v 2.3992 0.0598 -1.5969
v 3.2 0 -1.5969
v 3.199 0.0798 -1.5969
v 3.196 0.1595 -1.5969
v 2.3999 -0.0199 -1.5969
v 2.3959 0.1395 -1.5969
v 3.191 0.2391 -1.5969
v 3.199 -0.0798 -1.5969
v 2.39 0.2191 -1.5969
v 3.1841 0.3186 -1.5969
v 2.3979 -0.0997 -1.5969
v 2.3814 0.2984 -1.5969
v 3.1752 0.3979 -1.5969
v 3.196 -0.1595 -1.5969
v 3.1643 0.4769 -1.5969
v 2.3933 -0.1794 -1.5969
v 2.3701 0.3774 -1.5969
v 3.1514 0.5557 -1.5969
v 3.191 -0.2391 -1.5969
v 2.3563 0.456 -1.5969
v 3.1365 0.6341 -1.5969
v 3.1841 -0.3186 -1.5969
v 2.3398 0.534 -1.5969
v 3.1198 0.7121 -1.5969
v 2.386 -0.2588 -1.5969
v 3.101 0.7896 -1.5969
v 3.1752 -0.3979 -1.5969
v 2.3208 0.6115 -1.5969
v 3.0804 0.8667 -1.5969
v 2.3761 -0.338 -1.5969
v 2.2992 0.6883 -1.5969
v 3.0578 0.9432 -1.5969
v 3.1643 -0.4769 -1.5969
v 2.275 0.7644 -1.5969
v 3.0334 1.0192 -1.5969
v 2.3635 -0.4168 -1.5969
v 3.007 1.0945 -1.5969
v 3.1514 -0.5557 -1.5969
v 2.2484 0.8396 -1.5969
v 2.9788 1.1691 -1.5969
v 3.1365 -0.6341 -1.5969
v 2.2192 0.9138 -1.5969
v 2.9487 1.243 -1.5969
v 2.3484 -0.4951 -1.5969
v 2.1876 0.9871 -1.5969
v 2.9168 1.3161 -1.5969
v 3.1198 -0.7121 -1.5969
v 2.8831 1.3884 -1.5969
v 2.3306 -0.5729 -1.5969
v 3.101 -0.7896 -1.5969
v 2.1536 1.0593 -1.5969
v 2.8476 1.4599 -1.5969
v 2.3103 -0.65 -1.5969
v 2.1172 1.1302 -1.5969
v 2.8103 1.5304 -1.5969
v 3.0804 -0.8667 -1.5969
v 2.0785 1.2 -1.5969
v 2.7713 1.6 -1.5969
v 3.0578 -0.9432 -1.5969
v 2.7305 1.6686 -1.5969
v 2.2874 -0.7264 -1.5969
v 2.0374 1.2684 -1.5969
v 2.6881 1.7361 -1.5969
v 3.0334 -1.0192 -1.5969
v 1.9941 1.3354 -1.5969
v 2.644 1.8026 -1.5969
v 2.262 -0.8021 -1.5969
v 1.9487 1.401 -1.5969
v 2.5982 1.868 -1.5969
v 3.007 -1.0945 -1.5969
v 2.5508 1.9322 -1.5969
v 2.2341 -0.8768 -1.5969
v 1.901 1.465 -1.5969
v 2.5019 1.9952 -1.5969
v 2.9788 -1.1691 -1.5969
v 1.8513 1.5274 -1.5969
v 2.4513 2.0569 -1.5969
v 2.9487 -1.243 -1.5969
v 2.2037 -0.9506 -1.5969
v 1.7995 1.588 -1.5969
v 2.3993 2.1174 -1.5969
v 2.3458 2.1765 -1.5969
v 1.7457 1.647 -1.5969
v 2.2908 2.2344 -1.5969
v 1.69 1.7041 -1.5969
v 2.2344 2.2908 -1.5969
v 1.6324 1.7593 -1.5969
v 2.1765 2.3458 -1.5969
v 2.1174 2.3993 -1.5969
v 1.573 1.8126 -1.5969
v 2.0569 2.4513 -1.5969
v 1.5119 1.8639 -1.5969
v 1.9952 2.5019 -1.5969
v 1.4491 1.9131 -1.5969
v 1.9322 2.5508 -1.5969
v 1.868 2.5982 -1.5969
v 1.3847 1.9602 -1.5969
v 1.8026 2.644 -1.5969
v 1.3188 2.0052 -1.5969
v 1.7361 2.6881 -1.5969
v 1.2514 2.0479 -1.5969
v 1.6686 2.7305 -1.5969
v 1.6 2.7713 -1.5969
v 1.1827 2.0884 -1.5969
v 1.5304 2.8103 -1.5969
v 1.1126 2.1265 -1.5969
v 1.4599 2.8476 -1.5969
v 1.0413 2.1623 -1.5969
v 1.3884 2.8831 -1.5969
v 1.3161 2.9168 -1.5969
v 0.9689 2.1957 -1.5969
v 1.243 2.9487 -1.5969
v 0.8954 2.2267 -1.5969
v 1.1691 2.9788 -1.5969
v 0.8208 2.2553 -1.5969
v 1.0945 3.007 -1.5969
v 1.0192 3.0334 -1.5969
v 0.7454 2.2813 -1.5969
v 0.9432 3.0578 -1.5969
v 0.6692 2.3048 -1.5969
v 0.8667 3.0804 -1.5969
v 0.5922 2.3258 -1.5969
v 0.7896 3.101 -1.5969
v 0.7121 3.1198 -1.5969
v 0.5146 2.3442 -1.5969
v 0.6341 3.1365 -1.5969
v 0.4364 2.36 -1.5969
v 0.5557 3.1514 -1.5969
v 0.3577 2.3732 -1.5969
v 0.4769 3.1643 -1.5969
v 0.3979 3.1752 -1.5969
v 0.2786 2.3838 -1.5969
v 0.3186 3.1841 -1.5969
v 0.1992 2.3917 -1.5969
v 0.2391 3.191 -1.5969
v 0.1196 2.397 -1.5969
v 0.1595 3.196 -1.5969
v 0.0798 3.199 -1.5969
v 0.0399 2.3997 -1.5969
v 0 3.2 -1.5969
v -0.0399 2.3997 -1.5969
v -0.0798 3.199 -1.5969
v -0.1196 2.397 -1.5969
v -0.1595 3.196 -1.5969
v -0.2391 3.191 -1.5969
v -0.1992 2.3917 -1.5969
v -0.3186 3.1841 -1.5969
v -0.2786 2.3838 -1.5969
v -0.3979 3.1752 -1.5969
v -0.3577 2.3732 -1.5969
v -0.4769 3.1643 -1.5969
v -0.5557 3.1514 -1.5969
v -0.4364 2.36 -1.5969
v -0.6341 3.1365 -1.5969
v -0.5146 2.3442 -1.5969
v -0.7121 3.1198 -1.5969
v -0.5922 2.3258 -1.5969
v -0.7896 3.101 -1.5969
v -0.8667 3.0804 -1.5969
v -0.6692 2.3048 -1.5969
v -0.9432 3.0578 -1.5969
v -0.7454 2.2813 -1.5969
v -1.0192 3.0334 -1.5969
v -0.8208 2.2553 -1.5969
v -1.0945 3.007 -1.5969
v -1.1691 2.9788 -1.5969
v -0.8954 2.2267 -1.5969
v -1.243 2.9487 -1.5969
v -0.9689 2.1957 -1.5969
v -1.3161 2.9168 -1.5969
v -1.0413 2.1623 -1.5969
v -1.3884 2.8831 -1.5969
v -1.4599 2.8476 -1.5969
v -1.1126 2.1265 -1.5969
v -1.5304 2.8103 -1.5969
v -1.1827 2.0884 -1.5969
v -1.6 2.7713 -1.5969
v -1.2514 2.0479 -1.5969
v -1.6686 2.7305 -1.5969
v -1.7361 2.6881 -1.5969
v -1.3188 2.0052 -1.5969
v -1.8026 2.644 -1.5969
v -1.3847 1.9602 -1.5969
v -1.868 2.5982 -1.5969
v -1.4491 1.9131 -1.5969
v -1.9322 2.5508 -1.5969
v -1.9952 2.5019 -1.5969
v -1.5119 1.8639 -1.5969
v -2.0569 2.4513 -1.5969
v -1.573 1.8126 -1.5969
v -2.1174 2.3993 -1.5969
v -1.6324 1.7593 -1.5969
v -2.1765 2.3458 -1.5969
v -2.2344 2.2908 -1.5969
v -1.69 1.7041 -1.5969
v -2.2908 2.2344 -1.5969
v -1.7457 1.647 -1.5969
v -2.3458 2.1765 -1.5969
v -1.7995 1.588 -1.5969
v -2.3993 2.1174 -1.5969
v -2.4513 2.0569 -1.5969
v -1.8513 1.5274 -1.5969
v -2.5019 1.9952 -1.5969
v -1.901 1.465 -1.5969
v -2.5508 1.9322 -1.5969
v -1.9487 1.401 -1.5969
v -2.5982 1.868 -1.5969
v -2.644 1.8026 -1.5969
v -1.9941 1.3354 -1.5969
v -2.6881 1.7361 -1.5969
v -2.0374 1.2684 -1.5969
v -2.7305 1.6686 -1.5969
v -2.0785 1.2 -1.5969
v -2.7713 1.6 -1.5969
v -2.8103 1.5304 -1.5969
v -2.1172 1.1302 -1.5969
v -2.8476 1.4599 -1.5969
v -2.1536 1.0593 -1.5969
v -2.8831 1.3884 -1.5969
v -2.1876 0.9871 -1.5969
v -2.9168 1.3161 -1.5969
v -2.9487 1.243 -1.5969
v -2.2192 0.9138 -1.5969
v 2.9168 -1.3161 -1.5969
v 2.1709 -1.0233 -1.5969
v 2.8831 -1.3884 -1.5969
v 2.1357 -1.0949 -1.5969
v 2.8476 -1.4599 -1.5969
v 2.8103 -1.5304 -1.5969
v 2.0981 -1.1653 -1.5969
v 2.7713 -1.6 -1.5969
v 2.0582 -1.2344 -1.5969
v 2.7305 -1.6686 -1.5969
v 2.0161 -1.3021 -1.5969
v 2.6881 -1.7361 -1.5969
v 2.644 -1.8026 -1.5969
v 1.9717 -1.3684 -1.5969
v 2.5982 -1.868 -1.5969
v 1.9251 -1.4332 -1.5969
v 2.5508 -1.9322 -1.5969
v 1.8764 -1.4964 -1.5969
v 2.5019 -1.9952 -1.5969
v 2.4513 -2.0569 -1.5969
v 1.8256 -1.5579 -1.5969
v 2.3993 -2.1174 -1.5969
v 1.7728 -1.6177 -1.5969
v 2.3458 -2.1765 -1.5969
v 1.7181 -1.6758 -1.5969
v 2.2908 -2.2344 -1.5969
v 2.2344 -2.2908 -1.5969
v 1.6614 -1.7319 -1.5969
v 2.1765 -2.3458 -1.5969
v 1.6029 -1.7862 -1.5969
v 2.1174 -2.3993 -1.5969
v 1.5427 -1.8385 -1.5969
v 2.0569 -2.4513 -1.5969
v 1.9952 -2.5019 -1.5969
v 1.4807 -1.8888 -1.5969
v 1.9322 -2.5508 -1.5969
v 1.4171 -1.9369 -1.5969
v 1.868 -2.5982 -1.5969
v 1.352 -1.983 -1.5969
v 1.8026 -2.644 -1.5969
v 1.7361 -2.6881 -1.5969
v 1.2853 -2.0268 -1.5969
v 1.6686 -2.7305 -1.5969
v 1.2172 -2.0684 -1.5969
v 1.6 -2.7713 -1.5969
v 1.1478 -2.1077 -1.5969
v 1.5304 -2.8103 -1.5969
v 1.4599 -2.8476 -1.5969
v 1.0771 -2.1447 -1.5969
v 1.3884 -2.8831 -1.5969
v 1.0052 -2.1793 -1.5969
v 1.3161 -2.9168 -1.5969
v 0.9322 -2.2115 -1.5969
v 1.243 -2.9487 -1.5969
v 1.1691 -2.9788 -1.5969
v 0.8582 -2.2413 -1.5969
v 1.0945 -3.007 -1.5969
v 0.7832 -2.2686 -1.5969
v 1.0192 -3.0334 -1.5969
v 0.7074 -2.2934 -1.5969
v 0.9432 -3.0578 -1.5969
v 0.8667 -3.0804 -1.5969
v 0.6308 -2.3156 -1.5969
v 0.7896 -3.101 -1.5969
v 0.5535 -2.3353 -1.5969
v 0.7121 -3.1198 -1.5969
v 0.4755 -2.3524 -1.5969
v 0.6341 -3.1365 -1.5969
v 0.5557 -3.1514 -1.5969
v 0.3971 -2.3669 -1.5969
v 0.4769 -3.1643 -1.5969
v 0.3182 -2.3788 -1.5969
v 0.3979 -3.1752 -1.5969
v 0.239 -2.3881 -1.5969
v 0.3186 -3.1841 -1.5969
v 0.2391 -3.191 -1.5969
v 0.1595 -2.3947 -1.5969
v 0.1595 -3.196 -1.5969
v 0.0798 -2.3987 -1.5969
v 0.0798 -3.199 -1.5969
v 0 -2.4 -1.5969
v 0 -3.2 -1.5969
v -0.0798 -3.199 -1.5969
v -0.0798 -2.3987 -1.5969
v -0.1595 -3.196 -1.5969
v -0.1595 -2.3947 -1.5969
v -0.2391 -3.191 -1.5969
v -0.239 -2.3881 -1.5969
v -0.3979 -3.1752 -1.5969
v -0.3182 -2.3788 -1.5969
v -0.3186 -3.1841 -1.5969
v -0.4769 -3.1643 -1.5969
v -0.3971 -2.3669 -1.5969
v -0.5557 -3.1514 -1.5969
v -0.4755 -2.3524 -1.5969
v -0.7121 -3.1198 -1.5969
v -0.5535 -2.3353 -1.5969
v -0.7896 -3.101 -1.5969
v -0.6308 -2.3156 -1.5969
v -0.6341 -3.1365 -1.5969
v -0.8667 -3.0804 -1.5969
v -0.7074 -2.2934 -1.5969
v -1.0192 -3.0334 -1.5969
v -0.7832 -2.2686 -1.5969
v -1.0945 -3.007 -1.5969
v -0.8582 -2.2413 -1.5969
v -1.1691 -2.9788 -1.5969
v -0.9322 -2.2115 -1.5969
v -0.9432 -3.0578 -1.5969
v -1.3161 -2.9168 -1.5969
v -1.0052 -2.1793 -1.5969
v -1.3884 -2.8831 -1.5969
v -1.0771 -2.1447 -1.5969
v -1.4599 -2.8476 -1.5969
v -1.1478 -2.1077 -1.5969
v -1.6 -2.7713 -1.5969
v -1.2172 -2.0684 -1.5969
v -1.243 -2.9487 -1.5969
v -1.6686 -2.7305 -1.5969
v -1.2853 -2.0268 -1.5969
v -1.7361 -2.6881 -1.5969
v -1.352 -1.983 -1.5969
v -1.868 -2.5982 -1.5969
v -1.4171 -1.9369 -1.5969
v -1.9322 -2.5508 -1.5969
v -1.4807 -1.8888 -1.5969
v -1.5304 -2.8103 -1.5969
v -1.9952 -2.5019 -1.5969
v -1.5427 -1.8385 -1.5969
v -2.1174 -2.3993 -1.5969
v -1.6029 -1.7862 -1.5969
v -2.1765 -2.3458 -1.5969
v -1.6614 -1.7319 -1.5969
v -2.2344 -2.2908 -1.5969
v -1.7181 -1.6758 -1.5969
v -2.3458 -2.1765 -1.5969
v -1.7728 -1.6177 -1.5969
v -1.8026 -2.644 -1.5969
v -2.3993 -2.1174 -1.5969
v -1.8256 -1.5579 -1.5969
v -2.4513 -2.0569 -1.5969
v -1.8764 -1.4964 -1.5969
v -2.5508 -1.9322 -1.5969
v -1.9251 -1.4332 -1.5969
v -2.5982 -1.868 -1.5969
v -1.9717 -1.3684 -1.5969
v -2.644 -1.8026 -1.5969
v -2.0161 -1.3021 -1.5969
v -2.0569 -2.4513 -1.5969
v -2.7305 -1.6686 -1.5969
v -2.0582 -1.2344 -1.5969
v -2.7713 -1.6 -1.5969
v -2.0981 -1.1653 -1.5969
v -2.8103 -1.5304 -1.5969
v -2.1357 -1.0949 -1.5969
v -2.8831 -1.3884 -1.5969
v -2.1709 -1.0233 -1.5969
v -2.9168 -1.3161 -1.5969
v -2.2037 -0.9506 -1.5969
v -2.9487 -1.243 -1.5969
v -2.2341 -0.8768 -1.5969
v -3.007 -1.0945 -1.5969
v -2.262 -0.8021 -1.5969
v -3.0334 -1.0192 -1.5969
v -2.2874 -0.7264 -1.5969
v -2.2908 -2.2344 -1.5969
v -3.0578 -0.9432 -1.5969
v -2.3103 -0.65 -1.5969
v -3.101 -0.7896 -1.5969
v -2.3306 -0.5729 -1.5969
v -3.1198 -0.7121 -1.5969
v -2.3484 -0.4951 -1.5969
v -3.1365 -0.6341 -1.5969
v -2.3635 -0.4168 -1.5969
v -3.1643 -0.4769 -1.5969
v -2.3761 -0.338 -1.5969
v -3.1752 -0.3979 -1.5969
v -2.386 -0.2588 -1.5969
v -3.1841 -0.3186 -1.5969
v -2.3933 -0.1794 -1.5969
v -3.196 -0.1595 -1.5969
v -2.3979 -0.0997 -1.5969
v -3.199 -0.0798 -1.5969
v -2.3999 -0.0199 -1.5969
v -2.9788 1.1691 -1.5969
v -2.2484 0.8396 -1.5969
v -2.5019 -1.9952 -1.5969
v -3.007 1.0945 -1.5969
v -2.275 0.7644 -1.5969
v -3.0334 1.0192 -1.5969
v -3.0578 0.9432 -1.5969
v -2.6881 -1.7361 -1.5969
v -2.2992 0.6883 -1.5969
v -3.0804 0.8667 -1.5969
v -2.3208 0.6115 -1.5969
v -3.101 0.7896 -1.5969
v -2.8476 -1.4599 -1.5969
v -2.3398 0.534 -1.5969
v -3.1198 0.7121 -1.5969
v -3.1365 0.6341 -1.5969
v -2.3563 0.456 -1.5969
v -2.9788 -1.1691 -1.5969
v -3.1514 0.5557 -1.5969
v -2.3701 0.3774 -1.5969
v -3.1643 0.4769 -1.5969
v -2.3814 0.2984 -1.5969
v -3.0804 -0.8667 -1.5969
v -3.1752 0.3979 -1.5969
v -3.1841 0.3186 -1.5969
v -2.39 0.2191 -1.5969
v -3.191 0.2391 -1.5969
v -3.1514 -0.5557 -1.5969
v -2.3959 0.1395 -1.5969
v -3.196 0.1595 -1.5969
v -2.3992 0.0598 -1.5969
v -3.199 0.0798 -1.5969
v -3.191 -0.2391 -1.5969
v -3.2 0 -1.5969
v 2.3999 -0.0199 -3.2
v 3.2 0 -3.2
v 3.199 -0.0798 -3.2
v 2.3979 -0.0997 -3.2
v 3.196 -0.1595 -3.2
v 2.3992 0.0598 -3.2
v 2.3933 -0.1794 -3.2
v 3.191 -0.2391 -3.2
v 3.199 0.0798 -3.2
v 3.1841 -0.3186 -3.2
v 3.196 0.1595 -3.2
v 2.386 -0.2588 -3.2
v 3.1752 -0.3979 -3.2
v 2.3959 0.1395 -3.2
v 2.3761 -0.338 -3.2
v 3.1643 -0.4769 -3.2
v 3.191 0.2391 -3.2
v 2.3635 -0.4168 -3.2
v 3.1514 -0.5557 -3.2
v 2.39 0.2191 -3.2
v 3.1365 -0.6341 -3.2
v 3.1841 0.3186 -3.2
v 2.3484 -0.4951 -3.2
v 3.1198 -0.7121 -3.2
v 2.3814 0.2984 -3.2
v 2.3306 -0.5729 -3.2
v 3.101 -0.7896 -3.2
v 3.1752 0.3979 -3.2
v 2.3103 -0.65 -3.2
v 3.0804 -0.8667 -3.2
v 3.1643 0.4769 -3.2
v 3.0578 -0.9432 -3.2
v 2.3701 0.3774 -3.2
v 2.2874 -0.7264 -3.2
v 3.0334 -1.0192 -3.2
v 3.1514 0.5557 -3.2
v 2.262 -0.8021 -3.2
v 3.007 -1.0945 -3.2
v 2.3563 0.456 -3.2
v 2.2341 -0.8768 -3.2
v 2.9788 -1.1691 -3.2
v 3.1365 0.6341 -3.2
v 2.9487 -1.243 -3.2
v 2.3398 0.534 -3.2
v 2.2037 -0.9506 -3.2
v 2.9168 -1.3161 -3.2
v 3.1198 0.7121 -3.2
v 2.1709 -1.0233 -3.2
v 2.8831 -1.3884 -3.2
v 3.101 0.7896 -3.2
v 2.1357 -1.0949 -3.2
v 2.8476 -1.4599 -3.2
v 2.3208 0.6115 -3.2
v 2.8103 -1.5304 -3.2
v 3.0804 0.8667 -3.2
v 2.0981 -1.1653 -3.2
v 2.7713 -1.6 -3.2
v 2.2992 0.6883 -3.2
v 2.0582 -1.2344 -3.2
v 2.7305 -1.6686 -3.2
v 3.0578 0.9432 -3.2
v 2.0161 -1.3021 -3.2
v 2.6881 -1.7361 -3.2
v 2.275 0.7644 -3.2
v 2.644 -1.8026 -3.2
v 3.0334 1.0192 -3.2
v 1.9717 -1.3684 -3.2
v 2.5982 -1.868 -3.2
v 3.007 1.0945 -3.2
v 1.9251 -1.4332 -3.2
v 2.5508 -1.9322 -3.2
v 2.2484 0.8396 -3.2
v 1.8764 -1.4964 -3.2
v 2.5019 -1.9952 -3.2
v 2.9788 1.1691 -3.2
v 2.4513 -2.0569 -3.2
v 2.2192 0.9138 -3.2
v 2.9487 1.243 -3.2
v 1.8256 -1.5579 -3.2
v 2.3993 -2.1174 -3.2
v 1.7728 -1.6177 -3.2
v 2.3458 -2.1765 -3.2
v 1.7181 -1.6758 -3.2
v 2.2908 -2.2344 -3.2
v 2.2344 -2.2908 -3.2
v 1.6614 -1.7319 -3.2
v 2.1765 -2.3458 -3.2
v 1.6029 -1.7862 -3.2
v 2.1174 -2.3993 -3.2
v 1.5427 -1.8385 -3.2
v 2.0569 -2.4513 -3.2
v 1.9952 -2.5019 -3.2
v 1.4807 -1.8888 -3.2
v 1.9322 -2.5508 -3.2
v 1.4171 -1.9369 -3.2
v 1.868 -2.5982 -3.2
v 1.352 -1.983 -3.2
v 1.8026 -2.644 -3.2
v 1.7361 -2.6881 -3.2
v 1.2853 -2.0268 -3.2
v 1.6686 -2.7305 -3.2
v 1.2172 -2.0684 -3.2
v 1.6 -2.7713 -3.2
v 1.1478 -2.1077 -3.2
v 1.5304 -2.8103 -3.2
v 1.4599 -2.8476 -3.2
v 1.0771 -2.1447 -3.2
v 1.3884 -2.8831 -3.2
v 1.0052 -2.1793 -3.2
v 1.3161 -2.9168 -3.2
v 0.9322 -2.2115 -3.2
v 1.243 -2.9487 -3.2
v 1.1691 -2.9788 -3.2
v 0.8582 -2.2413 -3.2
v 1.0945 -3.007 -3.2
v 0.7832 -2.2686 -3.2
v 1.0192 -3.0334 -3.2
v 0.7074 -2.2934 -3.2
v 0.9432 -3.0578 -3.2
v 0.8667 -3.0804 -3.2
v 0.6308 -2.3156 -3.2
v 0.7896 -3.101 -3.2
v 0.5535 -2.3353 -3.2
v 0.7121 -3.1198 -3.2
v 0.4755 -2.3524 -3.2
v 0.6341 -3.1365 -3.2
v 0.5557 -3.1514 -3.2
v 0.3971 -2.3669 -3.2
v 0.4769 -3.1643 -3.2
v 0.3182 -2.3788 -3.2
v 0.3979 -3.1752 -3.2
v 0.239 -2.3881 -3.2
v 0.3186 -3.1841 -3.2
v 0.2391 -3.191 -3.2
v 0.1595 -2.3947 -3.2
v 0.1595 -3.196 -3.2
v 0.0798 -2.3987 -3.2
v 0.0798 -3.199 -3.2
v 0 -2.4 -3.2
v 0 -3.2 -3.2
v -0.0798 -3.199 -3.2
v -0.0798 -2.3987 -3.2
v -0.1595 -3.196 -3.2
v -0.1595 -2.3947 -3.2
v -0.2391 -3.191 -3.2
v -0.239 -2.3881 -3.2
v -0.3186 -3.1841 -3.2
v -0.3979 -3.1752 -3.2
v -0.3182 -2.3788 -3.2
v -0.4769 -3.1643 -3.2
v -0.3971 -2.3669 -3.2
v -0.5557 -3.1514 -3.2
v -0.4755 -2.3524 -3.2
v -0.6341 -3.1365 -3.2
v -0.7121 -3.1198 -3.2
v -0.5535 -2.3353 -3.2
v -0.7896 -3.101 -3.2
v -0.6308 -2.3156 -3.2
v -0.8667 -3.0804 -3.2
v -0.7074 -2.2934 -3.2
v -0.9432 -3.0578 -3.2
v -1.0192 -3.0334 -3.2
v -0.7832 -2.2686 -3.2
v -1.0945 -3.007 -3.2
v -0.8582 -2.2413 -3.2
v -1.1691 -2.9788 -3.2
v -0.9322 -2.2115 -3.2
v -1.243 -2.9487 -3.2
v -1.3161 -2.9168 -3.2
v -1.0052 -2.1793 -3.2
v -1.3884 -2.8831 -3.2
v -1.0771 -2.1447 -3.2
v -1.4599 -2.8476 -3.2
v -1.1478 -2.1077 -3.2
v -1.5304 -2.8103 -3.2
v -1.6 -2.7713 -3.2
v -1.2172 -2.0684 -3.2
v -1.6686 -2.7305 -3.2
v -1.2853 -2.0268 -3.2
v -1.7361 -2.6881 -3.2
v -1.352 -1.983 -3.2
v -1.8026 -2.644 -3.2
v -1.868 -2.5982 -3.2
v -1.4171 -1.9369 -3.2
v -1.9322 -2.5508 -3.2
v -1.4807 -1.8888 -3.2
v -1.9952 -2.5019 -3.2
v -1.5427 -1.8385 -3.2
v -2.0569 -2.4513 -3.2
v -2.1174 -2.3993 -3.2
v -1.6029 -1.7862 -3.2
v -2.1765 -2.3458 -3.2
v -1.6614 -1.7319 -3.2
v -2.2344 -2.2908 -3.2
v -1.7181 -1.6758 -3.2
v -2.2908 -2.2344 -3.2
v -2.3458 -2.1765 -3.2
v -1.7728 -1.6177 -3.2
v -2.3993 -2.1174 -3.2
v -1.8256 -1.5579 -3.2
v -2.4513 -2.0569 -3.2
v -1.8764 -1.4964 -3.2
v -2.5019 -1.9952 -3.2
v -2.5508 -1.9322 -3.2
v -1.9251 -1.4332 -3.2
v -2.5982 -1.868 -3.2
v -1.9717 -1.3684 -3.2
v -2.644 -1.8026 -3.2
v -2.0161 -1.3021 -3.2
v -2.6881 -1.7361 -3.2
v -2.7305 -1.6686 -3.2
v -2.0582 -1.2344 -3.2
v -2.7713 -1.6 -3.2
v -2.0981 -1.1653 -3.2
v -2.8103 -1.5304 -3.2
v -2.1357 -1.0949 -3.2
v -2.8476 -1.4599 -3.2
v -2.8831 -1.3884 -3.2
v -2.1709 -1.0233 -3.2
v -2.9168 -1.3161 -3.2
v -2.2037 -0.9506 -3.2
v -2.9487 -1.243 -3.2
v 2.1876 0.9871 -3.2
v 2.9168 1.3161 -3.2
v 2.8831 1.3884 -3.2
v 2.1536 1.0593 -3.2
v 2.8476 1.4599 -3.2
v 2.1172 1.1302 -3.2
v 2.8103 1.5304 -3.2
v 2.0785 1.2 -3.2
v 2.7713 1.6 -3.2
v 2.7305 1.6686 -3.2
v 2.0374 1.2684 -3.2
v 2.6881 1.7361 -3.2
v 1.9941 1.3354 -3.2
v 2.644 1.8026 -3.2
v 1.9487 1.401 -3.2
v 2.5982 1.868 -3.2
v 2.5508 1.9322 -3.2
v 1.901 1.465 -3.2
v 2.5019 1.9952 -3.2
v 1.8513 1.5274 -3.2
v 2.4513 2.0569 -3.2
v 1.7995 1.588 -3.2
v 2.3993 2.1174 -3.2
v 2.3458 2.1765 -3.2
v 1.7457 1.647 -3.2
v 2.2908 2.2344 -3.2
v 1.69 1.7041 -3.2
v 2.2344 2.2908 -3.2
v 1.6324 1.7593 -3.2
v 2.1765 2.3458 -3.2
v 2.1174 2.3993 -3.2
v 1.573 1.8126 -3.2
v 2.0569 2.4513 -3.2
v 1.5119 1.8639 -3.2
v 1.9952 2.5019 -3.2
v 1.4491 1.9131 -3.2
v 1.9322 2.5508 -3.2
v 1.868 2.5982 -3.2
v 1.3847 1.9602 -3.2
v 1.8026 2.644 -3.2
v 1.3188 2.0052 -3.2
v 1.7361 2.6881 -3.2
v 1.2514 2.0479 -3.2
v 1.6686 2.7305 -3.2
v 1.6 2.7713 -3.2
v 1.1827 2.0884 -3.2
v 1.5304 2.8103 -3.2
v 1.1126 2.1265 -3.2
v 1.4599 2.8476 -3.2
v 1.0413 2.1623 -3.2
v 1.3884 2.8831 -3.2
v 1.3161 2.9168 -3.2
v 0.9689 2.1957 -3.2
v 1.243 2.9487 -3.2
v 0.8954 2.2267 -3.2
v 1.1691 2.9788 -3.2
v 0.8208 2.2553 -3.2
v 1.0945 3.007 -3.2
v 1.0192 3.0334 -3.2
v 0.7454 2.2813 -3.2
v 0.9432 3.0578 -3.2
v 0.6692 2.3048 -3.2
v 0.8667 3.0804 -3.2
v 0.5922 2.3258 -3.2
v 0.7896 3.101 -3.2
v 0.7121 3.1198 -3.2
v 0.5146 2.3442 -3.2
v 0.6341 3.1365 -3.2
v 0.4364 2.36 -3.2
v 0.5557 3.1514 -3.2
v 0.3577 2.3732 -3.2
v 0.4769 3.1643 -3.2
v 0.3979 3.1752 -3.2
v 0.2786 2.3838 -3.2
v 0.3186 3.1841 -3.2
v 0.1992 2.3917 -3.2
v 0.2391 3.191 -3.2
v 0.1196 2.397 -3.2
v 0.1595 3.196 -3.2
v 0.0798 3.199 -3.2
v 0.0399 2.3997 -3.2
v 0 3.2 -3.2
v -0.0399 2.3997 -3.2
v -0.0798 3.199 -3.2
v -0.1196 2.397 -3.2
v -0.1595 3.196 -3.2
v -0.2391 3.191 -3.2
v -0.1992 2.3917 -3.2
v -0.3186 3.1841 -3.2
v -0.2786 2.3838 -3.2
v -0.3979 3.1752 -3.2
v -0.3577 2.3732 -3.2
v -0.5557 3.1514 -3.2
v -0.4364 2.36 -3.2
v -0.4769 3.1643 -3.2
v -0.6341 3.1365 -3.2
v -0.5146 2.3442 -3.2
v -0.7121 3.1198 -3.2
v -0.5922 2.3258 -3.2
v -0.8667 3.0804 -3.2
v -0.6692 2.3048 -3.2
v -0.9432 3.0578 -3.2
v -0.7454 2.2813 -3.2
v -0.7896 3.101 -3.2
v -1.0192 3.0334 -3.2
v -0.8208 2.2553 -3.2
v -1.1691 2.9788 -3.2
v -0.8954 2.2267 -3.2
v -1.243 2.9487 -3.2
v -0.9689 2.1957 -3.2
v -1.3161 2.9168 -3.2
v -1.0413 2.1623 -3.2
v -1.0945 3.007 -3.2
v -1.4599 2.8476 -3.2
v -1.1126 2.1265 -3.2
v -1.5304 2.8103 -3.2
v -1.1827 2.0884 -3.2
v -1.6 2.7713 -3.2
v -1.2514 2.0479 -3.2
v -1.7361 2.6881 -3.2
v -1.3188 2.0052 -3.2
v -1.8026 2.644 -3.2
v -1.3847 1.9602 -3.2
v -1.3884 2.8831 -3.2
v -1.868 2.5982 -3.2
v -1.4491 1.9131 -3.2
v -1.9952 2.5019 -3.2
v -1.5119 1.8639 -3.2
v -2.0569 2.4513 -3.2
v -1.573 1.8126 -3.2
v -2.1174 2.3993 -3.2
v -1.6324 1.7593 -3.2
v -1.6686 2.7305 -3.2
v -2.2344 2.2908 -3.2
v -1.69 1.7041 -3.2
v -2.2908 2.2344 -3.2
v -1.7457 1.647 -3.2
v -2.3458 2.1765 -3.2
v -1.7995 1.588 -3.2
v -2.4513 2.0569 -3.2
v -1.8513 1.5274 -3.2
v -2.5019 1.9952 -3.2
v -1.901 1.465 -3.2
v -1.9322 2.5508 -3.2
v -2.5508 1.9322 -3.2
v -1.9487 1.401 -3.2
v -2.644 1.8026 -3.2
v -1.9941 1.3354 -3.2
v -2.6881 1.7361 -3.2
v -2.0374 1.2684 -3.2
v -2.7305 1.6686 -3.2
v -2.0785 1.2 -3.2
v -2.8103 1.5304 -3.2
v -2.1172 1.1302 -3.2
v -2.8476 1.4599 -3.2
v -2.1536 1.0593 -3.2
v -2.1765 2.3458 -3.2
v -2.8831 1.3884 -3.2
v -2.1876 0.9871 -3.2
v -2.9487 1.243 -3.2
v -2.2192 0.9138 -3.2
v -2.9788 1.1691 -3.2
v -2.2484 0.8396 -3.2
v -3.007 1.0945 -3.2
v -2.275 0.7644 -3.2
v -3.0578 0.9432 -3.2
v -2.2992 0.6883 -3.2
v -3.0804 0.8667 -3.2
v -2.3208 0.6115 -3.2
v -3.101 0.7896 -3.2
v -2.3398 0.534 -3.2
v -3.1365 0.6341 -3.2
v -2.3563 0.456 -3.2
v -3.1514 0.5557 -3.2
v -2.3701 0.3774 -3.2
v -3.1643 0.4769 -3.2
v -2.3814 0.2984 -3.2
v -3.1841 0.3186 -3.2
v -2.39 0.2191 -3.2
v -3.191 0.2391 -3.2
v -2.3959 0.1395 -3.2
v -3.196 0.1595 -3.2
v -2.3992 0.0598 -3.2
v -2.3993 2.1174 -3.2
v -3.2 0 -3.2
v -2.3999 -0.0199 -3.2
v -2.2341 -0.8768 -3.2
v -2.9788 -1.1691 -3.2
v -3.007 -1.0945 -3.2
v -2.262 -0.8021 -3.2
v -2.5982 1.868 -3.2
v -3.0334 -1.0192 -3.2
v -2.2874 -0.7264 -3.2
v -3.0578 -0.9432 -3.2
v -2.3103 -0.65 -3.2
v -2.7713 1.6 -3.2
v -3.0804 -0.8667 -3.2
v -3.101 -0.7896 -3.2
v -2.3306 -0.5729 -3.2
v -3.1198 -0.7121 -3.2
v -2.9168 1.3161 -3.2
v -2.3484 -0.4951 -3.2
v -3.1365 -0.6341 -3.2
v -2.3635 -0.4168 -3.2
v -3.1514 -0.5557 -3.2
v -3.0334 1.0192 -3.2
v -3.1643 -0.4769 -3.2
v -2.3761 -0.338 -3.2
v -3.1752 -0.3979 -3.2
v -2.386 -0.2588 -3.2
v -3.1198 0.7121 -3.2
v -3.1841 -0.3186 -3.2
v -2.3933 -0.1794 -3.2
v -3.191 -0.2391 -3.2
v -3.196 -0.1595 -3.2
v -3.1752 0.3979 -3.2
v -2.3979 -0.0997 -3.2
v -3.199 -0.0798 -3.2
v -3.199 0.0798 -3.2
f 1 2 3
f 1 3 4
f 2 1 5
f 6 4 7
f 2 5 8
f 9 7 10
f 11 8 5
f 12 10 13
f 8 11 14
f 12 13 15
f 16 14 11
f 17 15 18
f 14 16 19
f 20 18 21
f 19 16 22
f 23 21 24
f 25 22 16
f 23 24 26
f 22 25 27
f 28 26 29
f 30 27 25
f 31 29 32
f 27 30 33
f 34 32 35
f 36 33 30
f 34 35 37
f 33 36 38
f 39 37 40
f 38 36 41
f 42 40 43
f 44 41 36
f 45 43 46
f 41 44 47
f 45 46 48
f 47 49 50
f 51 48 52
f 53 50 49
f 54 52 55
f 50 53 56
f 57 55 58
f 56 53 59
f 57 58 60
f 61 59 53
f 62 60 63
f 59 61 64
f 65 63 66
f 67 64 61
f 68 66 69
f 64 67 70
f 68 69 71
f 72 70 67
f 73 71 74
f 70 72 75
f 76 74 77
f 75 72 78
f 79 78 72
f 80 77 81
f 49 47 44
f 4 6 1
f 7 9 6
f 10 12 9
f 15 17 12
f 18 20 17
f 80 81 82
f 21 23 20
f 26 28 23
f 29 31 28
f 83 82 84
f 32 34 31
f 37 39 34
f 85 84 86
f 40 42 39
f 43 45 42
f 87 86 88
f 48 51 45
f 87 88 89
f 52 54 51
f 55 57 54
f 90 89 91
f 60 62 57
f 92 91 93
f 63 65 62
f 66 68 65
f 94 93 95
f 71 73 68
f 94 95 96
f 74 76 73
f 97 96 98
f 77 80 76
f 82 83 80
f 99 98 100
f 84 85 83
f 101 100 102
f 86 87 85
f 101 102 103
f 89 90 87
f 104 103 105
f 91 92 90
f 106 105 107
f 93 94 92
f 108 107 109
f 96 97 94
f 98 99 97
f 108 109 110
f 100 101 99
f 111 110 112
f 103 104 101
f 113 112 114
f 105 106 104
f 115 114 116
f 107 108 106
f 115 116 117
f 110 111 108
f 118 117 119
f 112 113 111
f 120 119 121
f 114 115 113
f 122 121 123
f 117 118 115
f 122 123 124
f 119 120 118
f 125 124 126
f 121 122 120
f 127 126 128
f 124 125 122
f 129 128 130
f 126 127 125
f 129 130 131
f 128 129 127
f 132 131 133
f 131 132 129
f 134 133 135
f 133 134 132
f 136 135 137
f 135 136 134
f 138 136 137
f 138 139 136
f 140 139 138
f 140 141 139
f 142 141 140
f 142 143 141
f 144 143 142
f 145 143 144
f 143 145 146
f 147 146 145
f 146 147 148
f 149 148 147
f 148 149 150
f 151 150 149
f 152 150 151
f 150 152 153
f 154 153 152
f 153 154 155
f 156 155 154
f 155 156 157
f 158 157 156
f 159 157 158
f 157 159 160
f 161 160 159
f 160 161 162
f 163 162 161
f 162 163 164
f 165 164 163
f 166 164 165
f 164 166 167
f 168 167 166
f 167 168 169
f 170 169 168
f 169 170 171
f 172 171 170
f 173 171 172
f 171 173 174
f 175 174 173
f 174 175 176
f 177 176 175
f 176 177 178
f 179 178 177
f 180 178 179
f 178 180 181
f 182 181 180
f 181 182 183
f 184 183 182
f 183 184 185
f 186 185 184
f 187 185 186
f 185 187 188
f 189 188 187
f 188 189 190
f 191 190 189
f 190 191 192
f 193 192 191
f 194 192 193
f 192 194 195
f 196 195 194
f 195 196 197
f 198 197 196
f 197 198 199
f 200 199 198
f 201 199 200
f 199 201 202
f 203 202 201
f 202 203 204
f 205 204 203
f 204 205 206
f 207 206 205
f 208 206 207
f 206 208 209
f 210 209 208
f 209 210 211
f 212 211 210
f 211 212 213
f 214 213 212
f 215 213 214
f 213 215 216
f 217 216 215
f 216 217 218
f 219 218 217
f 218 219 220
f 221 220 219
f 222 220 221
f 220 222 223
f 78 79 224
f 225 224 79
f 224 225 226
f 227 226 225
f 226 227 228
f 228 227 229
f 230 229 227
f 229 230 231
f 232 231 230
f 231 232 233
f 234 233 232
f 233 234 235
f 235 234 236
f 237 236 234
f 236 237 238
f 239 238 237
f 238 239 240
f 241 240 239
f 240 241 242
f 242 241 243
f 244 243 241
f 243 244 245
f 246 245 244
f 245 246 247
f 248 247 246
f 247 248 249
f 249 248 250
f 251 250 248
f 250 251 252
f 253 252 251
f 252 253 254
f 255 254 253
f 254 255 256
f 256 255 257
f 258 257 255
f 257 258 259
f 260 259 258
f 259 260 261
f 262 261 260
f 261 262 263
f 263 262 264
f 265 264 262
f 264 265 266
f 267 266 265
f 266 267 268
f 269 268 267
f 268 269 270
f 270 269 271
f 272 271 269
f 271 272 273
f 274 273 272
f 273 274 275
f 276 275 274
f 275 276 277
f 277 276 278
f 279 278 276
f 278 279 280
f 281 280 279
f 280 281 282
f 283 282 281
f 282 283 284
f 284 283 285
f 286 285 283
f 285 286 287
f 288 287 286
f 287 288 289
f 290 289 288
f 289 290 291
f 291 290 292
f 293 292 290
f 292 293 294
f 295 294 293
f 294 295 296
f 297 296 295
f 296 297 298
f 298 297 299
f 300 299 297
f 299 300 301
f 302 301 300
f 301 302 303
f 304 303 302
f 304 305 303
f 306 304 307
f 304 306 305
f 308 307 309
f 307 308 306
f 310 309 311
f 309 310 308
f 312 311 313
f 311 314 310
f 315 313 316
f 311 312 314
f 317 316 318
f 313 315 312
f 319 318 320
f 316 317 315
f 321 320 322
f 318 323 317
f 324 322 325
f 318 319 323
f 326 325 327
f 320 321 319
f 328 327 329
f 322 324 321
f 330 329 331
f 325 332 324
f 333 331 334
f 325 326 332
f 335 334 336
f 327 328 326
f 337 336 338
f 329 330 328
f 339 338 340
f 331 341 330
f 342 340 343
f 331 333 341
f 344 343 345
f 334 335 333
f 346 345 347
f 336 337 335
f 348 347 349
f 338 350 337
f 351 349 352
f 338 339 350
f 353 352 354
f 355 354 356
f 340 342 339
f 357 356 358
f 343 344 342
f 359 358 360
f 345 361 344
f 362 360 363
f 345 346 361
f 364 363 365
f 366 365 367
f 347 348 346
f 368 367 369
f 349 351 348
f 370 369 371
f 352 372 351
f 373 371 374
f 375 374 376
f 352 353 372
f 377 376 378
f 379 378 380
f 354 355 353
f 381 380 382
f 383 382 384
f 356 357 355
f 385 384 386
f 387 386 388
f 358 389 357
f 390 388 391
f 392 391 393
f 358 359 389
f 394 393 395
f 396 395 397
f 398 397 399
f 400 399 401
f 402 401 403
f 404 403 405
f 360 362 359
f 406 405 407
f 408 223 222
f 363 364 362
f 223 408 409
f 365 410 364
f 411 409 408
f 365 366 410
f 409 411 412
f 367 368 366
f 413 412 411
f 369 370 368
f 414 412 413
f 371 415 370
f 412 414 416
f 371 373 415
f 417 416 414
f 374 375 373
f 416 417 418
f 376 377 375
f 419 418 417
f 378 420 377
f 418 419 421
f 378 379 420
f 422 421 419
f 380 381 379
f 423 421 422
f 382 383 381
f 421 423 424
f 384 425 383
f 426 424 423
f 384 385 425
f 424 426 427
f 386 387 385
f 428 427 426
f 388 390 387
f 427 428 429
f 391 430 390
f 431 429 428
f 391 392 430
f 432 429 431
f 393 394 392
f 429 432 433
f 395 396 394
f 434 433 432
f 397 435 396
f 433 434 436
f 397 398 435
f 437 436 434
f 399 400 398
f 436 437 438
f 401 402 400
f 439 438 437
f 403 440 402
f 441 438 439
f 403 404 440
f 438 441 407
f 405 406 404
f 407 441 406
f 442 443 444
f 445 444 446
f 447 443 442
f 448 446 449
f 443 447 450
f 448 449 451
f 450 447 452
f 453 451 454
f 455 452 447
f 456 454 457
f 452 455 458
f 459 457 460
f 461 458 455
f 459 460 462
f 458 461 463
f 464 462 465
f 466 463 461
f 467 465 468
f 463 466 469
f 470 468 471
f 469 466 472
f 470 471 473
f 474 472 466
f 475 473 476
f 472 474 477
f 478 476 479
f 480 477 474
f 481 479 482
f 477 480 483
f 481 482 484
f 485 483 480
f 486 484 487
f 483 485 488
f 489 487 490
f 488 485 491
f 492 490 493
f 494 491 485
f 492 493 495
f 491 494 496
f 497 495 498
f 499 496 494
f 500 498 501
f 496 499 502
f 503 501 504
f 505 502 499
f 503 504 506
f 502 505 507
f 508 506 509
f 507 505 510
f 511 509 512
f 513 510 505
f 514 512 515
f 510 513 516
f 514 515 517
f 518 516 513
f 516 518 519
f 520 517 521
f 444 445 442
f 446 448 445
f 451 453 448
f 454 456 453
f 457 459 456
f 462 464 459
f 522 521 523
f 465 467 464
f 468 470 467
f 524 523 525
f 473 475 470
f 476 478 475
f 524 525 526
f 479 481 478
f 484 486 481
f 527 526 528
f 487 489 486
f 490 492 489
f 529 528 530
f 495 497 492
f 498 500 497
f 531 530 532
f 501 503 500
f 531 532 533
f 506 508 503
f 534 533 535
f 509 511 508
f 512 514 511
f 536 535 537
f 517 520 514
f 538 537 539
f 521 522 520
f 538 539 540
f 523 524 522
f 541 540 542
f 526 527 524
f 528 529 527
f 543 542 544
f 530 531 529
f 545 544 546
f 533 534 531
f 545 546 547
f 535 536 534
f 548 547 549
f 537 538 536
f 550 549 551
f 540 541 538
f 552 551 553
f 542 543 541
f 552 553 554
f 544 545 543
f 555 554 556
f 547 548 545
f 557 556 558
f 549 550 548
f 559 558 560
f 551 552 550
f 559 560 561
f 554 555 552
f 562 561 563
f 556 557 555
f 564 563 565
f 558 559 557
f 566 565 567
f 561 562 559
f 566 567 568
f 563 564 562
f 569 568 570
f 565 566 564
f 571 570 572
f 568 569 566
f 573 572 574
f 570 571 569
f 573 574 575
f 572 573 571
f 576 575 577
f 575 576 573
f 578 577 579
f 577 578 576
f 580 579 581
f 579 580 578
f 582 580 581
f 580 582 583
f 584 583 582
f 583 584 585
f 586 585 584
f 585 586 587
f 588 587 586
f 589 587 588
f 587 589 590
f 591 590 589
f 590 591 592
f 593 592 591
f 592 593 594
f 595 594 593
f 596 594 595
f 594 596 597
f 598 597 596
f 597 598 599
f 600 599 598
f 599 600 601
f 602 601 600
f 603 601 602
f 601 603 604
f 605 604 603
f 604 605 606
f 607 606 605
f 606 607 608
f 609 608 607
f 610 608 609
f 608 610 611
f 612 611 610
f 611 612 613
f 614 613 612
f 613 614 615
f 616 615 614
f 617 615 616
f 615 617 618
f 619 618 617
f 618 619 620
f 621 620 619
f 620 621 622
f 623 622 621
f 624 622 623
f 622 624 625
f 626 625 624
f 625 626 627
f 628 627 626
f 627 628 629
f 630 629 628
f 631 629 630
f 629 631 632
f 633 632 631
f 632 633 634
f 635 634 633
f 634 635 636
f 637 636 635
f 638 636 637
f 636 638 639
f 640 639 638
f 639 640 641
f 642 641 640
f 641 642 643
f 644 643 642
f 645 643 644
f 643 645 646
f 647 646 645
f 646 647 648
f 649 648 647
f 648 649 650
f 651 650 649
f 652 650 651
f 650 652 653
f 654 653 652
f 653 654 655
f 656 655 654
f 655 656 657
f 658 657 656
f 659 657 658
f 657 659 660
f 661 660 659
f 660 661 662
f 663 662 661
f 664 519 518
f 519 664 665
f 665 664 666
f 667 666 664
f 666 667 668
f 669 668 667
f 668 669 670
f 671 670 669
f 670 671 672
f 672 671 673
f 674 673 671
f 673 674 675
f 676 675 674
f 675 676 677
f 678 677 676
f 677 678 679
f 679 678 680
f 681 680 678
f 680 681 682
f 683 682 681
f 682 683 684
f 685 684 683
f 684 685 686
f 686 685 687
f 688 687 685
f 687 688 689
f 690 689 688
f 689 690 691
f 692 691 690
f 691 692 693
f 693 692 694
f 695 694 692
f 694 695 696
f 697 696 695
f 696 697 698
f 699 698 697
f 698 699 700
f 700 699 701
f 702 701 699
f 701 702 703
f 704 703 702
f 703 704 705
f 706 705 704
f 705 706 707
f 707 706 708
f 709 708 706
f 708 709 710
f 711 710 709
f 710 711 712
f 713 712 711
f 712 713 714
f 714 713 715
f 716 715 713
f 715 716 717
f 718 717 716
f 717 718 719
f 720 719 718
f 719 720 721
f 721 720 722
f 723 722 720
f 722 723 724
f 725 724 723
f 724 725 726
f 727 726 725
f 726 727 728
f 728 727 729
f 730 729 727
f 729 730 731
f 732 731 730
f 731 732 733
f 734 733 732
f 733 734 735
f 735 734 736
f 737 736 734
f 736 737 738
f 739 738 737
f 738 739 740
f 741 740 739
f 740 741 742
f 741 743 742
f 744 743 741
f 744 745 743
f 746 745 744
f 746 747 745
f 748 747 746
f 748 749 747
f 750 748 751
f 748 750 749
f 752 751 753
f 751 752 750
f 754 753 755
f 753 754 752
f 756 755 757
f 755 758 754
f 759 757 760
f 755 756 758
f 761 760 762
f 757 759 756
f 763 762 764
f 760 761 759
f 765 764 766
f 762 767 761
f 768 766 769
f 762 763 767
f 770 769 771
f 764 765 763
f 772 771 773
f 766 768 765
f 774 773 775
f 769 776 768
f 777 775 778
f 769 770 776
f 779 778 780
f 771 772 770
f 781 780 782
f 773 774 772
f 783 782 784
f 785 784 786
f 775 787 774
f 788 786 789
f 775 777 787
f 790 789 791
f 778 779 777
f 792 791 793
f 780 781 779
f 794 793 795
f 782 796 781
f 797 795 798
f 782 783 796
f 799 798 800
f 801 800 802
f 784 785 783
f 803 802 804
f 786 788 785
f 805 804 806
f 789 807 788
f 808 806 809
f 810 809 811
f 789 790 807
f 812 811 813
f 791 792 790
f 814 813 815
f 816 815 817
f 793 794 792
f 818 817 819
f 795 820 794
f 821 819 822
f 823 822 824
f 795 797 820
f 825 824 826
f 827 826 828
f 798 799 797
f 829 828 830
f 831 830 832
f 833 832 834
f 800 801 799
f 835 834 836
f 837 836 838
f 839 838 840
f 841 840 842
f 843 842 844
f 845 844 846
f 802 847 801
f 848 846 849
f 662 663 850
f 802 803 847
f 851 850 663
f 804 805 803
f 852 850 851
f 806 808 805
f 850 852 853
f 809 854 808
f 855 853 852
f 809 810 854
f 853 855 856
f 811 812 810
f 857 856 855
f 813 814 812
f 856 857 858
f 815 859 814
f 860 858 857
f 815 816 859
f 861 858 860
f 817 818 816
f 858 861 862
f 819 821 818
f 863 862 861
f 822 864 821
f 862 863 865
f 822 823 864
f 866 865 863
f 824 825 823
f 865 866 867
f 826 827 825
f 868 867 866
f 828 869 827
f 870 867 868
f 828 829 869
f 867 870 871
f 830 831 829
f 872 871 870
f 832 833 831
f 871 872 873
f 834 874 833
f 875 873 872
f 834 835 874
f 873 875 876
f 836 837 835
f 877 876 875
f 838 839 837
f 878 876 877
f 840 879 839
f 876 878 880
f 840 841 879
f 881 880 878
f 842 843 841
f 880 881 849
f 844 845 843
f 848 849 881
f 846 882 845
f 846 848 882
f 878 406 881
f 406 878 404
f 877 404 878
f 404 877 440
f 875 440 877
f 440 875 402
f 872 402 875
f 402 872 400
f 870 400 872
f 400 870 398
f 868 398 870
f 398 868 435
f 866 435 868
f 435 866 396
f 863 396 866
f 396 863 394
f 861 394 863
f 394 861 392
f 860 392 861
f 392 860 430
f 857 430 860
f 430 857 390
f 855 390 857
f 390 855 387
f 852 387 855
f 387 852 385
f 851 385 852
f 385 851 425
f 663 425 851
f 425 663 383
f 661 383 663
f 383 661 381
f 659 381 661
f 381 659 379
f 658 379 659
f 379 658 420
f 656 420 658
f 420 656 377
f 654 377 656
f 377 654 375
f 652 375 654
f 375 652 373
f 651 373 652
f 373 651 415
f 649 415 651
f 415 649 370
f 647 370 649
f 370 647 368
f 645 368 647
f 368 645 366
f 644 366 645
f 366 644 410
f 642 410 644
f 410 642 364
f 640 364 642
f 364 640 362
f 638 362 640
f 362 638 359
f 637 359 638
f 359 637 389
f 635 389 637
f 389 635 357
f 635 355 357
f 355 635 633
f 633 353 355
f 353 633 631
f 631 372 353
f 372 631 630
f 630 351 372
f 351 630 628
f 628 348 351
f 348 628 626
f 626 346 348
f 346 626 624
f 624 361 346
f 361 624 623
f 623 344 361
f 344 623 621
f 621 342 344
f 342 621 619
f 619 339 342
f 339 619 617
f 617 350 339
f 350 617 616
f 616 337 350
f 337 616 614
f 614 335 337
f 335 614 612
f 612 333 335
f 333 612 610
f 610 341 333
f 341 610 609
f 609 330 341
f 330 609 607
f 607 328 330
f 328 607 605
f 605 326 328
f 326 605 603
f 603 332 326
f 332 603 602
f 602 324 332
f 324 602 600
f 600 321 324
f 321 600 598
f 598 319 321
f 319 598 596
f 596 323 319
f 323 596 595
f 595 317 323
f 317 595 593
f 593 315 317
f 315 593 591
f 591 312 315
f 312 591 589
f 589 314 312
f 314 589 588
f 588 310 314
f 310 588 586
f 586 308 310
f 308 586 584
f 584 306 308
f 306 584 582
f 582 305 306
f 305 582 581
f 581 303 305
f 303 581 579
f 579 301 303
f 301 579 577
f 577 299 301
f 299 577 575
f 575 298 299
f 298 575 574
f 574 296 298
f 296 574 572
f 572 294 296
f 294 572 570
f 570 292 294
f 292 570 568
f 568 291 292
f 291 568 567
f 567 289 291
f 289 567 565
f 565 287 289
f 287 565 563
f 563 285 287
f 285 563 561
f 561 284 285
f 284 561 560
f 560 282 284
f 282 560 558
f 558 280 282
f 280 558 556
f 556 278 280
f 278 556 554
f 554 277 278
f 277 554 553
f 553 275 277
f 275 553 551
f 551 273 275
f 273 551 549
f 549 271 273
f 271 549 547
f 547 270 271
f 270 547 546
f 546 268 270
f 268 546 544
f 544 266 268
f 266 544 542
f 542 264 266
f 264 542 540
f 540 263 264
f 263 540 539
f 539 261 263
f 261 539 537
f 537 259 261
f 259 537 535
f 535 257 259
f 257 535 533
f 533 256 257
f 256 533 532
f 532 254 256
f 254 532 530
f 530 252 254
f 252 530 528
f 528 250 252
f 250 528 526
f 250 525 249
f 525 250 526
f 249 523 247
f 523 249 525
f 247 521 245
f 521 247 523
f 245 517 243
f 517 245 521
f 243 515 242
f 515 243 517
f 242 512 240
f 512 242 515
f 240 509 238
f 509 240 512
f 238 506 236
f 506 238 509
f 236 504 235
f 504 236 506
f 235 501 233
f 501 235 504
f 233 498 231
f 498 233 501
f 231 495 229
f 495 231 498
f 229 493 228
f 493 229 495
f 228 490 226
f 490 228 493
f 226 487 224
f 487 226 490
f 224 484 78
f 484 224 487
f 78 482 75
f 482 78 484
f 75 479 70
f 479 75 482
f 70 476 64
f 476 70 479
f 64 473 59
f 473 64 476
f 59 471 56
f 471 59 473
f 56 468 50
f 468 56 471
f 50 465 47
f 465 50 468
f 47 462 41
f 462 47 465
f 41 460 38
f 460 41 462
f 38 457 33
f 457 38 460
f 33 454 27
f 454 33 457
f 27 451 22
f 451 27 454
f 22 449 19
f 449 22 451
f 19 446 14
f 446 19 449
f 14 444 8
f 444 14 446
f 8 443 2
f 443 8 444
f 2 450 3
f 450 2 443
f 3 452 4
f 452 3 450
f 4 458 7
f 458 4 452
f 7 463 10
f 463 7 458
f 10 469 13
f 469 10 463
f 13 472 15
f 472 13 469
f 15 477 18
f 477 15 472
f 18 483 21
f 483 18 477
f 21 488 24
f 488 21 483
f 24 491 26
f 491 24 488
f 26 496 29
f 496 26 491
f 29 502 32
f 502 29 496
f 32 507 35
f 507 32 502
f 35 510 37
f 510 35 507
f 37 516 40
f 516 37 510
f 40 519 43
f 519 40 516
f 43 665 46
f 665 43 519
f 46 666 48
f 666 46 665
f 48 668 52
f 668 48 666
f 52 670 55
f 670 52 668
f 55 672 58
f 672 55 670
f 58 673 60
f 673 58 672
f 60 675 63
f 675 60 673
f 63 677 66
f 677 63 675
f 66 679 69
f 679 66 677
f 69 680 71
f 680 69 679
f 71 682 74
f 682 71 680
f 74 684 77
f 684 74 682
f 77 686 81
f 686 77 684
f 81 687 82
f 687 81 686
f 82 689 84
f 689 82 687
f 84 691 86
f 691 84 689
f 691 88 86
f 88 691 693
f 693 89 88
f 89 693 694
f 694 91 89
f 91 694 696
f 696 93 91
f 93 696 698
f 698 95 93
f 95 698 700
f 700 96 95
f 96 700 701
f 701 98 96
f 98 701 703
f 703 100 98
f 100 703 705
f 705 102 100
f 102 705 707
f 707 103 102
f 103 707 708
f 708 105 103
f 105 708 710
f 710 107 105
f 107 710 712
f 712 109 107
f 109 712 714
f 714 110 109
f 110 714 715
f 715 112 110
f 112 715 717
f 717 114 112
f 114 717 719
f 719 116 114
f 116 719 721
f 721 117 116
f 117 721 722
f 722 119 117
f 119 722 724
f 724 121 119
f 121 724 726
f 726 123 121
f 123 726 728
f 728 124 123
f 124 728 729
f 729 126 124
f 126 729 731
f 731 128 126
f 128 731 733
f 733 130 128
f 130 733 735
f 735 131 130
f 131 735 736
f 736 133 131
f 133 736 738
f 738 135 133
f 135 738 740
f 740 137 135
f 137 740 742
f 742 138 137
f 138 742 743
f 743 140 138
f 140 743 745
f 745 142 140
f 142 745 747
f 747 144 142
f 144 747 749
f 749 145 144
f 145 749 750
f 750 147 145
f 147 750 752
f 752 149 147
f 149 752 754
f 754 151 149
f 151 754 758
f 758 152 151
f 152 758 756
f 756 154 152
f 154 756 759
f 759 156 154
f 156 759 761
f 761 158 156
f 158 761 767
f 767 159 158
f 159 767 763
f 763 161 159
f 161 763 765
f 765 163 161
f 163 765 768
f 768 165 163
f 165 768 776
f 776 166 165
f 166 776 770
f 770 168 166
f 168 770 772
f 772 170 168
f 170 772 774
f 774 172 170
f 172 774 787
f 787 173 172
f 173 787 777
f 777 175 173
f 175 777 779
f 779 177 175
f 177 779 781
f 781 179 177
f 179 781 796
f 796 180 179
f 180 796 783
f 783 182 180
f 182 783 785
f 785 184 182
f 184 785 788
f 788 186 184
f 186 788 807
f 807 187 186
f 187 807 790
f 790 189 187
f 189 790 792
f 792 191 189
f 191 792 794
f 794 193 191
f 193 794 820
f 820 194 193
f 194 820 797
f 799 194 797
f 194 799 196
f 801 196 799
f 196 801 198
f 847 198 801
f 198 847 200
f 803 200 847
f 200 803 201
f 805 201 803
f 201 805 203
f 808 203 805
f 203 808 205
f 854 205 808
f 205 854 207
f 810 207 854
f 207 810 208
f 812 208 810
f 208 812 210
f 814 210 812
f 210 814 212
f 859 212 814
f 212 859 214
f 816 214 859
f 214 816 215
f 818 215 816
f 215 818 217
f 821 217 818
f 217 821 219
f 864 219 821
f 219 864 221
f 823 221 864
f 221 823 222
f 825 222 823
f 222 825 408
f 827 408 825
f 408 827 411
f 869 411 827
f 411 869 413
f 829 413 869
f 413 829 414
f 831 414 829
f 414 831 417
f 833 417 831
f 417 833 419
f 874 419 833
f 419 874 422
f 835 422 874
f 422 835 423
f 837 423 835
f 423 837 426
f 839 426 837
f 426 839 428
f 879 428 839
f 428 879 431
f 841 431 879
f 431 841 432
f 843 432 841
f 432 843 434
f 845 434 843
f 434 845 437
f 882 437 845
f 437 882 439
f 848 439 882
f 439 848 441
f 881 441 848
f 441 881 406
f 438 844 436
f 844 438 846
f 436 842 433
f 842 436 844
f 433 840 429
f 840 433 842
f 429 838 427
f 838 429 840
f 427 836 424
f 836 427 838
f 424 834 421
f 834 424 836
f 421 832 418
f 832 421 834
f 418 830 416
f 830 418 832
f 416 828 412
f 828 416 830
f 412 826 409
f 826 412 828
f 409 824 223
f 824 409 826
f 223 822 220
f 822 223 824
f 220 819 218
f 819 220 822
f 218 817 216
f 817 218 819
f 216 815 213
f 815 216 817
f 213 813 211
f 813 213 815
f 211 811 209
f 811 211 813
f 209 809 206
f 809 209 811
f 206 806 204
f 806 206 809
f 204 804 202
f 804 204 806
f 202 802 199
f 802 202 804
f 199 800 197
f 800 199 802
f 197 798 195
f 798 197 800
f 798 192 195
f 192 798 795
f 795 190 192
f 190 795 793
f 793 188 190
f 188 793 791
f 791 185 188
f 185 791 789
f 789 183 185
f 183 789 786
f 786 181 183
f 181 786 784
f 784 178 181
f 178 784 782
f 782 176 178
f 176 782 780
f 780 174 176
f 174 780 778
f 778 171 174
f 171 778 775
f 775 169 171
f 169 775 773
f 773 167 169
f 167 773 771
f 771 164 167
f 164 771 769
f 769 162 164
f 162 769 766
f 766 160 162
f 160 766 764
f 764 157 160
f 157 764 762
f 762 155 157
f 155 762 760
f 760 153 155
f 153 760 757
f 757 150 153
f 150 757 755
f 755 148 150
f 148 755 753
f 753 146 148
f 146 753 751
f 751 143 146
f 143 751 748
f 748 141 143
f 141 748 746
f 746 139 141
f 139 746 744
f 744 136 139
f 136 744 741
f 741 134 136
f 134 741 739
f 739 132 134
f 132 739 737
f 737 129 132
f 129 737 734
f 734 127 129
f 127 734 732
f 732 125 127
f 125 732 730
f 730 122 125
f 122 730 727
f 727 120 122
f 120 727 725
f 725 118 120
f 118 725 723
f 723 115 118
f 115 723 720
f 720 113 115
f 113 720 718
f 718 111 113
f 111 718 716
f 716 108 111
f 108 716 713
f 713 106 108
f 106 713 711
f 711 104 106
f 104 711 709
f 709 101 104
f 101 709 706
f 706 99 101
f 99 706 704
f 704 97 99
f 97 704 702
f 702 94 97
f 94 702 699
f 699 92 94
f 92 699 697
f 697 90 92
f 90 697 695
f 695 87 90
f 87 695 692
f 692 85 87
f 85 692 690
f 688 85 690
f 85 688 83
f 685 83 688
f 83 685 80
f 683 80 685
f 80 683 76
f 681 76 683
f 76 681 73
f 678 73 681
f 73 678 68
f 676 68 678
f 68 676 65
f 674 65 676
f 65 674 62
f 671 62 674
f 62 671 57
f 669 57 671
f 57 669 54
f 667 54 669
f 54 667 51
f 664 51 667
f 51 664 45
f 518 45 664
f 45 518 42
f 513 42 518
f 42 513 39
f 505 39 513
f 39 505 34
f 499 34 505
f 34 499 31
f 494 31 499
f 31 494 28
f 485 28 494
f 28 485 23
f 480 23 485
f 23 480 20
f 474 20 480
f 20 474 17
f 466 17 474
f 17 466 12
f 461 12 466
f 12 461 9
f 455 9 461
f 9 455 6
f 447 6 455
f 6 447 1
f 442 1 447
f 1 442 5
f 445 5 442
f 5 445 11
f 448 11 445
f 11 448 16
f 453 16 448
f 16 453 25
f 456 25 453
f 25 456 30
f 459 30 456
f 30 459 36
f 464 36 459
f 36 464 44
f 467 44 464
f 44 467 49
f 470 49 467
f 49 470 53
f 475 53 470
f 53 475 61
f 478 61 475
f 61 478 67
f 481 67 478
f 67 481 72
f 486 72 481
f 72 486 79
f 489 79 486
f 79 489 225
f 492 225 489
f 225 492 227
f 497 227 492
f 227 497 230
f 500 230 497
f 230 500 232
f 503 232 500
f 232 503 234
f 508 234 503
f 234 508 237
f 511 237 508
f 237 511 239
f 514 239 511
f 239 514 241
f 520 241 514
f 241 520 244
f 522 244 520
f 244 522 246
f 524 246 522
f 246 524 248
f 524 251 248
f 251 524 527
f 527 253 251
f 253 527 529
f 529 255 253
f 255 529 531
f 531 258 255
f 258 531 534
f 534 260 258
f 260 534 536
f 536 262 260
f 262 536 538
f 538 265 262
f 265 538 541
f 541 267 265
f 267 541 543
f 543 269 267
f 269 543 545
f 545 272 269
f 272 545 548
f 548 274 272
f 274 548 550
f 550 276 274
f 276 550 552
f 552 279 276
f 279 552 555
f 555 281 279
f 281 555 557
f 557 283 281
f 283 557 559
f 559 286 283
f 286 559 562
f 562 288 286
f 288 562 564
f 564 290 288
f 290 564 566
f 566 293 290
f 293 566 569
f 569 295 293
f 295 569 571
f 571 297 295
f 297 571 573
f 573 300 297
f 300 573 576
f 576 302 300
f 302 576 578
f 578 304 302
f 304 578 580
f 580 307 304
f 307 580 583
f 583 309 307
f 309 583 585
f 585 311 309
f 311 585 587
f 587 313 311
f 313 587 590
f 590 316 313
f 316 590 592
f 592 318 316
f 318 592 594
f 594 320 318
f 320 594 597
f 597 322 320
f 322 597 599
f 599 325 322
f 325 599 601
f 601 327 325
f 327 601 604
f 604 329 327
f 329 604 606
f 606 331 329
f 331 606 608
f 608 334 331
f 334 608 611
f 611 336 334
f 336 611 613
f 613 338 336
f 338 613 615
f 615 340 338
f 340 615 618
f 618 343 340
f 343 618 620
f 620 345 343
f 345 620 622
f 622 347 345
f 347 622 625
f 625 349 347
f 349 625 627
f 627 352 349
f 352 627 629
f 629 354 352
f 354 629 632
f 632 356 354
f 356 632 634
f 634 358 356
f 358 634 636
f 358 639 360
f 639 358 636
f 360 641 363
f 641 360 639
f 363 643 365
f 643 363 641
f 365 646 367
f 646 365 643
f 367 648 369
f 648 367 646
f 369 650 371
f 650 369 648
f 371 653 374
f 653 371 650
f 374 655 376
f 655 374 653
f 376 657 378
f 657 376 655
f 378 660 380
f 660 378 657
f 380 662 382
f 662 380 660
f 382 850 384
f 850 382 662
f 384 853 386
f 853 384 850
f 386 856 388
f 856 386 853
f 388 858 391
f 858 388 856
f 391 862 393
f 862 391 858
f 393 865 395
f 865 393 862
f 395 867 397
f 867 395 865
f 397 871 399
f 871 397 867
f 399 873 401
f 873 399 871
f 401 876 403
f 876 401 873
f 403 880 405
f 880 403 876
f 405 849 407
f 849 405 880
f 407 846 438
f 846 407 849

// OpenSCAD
use <../lib.scad>
use <s/48995s01.scad>
$fa=1; $fs=0.2;
function ldraw_lib__48995(realsolid=false) = [
// 0 Tile  2 x  3 Rounded with Hole
// 0 Name: 48995.dat
// 0 Author: Steffen [Steffen]
// 0 !LDRAW_ORG Part UPDATE 2014-02
// 0 !LICENSE Licensed under CC BY 2.0 and CC BY 4.0 : see CAreadme.txt
// 
// 0 BFC CERTIFY CCW
  [0,"BFC","CERTIFY"],
  [0,"BFC","CCW"],
// 
// 0 !HISTORY 2004-11-01 [SirBugge] Changed internal details to fit 48'ing
// 0 !HISTORY 2005-01-02 [SirBugge] Fixed a few leftovers
// 0 !HISTORY 2009-10-03 [Eldar] Correct bfc invertnext lines
// 0 !HISTORY 2010-04-05 [PTadmin] Official Update 2010-01
// 0 !HISTORY 2014-07-24 [MagFors] Subfiled for pattern
// 0 !HISTORY 2014-12-23 [PTadmin] Official Update 2014-02
// 
// 
// 1 16 0 0 0 1 0 0 0 1 0 0 0 1 s\48995s01.dat
  [1,16,0,0,0,1,0,0,0,1,0,0,0,1, ldraw_lib__s__48995s01(realsolid)],
// 4 16 20 0 20 -20 0 20 -20 0 -20 20 0 -20
  [4,16,20,0,20,-20,0,20,-20,0,-20,20,0,-20],
];
module ldraw_lib__48995(step=0, col=false, unit=2/5, alt=false, line=0.2, solid=!$preview)
    makepoly(ldraw_lib__48995(solid), step=step, col=col, unit=unit, alt=alt, line=line, solid=solid);
ldraw_lib__48995(line=0.2);
